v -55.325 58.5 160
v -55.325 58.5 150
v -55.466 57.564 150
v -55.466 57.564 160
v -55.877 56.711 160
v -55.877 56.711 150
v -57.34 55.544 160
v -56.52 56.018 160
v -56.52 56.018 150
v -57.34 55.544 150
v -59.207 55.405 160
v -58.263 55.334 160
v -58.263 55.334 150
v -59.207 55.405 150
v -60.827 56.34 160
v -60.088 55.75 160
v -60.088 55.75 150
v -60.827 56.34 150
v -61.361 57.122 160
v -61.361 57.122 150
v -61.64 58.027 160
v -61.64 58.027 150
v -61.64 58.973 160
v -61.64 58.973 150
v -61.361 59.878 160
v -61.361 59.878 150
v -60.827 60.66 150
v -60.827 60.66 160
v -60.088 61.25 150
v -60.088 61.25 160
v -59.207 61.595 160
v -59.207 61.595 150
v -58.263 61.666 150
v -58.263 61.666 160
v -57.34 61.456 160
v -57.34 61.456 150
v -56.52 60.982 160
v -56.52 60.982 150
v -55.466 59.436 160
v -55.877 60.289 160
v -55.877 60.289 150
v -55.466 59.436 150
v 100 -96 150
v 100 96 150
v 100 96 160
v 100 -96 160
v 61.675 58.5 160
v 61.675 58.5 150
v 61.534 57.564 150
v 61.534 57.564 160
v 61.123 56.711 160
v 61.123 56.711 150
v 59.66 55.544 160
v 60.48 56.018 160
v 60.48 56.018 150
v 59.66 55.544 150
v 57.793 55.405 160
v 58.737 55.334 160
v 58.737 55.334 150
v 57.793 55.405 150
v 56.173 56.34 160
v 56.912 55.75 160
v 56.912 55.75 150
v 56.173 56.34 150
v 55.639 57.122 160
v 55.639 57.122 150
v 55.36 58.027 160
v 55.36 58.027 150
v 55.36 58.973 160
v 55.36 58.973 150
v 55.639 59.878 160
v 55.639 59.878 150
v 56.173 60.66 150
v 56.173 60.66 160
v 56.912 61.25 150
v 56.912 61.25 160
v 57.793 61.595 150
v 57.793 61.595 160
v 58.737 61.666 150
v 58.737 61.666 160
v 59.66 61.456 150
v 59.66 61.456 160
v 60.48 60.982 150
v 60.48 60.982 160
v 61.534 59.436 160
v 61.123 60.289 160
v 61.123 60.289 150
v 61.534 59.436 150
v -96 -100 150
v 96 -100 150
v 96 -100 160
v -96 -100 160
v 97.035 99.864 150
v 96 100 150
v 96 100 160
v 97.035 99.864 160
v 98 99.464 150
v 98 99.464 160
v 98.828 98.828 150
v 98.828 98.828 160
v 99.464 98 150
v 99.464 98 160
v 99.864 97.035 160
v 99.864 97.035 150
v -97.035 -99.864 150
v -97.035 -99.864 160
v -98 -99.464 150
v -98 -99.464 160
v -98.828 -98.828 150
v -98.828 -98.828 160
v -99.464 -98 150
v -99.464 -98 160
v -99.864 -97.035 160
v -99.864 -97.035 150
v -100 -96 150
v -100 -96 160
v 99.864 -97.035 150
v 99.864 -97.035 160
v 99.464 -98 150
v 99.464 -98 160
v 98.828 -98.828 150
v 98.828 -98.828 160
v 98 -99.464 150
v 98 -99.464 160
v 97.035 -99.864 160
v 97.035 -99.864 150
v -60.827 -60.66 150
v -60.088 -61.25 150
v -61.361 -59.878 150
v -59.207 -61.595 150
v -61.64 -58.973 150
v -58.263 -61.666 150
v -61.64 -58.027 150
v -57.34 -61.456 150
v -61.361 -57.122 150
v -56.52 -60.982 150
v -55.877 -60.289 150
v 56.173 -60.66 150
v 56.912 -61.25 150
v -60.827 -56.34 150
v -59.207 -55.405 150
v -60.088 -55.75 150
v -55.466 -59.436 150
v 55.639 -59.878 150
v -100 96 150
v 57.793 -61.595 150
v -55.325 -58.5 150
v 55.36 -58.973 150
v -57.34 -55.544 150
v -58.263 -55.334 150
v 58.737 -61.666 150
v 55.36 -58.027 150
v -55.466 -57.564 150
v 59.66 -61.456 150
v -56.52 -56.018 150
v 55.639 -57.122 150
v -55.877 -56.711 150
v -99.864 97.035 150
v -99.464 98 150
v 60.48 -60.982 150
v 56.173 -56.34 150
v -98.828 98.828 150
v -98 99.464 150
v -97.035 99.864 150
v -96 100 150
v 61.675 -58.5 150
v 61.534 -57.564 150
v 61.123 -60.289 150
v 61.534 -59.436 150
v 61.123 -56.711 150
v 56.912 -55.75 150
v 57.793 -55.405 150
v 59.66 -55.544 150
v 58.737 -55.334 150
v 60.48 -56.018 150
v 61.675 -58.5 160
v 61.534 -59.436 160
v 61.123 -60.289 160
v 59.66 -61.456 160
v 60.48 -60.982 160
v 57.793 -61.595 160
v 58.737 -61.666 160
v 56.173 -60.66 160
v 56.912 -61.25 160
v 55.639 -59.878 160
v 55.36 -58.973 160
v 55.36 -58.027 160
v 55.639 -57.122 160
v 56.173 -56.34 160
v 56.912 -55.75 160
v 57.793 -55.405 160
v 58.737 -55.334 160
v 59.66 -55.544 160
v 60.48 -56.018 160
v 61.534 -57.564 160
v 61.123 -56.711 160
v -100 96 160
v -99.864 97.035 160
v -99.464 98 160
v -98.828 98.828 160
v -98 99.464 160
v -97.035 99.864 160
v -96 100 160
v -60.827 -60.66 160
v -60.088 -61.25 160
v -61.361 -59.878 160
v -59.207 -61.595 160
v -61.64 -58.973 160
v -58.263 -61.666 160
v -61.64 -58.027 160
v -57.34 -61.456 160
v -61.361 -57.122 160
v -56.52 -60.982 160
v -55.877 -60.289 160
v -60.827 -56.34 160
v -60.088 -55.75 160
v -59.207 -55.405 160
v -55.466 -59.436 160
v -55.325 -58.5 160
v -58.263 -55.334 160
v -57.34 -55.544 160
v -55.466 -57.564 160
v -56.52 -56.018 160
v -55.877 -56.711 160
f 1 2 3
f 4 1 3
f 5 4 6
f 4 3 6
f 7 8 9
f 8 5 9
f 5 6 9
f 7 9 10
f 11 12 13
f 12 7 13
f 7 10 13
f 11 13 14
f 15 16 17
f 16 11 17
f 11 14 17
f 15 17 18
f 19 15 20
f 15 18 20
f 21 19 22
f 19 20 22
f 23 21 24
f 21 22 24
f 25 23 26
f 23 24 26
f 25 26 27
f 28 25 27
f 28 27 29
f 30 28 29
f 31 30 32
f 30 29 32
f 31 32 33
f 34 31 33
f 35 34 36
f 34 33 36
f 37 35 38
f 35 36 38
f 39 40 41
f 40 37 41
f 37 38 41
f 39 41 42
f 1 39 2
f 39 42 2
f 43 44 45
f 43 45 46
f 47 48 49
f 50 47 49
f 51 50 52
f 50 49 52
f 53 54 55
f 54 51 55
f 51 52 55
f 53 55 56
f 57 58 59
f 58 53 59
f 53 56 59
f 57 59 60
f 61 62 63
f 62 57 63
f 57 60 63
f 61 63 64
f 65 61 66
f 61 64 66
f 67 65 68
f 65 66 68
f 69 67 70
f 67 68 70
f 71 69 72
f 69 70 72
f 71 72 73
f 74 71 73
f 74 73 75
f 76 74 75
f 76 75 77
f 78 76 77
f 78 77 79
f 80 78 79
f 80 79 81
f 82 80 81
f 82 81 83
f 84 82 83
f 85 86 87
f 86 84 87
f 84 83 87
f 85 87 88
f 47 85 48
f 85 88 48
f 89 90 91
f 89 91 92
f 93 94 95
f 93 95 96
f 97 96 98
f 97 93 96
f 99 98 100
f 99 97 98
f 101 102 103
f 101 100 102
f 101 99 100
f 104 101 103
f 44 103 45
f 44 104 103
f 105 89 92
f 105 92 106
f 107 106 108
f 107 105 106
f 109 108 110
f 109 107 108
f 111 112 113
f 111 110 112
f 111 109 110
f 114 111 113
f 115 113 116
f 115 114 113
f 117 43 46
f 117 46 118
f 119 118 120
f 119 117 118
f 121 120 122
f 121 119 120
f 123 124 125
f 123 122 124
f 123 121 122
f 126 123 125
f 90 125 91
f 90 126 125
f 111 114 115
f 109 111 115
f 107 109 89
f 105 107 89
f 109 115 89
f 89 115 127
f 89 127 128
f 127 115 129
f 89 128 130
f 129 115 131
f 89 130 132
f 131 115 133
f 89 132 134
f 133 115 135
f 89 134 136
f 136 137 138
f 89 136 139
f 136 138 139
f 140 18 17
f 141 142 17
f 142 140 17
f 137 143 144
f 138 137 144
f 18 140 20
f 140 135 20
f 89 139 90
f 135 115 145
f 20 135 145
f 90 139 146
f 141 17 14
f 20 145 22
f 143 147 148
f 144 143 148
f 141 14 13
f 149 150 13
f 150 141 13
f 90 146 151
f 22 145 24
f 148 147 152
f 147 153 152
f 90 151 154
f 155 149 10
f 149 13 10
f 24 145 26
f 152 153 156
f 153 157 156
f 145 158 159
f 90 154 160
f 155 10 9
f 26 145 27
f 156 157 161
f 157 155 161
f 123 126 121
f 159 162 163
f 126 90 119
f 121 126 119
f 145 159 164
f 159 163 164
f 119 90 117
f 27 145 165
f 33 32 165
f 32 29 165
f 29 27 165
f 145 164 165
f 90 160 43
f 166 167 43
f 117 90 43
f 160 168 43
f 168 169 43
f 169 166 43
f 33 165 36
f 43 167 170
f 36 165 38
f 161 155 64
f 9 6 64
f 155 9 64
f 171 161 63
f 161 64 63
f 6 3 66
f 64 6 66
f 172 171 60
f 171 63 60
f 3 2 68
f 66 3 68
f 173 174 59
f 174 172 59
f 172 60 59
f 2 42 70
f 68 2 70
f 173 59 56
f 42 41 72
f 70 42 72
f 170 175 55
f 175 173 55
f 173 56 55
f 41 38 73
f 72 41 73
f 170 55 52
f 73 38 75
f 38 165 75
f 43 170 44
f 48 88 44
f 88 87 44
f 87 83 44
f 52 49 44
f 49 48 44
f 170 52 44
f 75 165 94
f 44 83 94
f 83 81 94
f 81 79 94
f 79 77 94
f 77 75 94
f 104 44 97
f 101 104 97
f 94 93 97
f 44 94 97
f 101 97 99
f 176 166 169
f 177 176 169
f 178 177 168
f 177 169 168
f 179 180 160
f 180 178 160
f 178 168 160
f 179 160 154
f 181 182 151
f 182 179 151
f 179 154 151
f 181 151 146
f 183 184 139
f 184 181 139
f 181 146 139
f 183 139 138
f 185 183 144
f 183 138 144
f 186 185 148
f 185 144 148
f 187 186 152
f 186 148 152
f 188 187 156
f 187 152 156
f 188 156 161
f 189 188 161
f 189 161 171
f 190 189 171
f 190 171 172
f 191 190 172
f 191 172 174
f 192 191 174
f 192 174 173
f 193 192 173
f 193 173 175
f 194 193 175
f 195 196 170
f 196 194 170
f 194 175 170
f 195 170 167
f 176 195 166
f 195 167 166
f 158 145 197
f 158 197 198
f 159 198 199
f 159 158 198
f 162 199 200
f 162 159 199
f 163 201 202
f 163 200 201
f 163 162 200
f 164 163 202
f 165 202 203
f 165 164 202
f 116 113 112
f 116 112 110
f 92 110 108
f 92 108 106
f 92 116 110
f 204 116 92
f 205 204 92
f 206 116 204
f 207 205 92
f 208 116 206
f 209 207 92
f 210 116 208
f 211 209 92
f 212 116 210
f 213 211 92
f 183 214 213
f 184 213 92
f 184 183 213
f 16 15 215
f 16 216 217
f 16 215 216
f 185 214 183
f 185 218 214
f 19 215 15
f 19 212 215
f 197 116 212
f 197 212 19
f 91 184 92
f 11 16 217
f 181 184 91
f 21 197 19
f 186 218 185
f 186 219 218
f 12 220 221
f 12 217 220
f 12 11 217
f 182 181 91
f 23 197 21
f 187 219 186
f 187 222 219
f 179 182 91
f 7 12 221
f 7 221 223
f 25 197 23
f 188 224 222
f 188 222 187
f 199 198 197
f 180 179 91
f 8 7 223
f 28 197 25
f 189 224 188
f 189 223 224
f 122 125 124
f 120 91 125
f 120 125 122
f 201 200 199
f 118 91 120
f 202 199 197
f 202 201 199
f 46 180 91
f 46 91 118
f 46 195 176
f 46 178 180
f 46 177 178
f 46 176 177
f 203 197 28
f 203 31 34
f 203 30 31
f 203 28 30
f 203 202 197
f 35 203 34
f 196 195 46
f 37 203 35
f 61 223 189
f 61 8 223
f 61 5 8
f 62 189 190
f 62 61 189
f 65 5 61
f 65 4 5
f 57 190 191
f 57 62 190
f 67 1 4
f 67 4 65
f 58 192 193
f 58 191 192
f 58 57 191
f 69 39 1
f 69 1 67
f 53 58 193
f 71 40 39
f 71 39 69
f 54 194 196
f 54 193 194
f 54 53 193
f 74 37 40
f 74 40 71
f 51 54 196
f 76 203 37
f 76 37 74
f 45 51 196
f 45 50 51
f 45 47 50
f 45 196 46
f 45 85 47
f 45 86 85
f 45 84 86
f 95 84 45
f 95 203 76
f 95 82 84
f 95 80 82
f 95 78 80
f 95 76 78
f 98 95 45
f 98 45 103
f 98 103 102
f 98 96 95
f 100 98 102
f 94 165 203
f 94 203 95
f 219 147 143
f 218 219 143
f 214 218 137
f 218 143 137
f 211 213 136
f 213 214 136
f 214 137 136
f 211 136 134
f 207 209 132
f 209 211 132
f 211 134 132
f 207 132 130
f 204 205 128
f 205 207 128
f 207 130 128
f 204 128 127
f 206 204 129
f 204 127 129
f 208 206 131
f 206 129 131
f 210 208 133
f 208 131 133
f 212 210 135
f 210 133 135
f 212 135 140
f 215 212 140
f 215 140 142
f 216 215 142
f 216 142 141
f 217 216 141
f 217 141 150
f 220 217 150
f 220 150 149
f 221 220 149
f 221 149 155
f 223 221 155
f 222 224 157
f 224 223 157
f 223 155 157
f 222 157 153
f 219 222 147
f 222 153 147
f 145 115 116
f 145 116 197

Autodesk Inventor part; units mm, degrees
ref_plane "YZ Plane" through (0, 0, 0) normal (1, 0, 0) x (0, 1, 0)
ref_plane "XZ Plane" through (0, 0, 0) normal (0, 1, 0) x (-1, 0, 0)
ref_plane "XY Plane" through (0, 0, 0) normal (0, 0, 1) x (1, 0, 0)
ref_plane "Plano de trabajo1" through (0, 0, 150) normal (0, 0, 1) x (1, 0, 0)
sketch "Boceto1" plane through (0, 0, 150) normal (0, 0, 1) x (1, 0, 0)
  line L0 (-96, 100) -> (96, 100)
  line L1 (100, 96) -> (100, -96)
  line L2 (96, -100) -> (-96, -100)
  line L3 (-100, -96) -> (-100, 96)
  line L4 (-100, 100) -> (100, -100) construction
  line L5 (100, 100) -> (-100, -100) construction
  arc A0 (100, 96) -> (96, 100) centre (96, 96) ccw
  arc A1 (-96, 100) -> (-100, 96) centre (-96, 96) ccw
  arc A2 (-100, -96) -> (-96, -100) centre (-96, -96) ccw
  arc A3 (96, -100) -> (100, -96) centre (96, -96) ccw
  circle A4 centre (58.5, 58.5) radius 3.175 projected
  circle A5 centre (-58.5, 58.5) radius 3.175 projected
  circle A6 centre (-58.5, -58.5) radius 3.175 projected
  circle A7 centre (58.5, -58.5) radius 3.175 projected
  point P0 (0, 0)
  dimension "d0" = 200
  dimension "d1" = 200
  dimension "d2" = 4
extrude "Extrusión1" add sketch "Boceto1" along normal blind 10
properties part number "TablaSoporte2" material "Madera (abedul)"
